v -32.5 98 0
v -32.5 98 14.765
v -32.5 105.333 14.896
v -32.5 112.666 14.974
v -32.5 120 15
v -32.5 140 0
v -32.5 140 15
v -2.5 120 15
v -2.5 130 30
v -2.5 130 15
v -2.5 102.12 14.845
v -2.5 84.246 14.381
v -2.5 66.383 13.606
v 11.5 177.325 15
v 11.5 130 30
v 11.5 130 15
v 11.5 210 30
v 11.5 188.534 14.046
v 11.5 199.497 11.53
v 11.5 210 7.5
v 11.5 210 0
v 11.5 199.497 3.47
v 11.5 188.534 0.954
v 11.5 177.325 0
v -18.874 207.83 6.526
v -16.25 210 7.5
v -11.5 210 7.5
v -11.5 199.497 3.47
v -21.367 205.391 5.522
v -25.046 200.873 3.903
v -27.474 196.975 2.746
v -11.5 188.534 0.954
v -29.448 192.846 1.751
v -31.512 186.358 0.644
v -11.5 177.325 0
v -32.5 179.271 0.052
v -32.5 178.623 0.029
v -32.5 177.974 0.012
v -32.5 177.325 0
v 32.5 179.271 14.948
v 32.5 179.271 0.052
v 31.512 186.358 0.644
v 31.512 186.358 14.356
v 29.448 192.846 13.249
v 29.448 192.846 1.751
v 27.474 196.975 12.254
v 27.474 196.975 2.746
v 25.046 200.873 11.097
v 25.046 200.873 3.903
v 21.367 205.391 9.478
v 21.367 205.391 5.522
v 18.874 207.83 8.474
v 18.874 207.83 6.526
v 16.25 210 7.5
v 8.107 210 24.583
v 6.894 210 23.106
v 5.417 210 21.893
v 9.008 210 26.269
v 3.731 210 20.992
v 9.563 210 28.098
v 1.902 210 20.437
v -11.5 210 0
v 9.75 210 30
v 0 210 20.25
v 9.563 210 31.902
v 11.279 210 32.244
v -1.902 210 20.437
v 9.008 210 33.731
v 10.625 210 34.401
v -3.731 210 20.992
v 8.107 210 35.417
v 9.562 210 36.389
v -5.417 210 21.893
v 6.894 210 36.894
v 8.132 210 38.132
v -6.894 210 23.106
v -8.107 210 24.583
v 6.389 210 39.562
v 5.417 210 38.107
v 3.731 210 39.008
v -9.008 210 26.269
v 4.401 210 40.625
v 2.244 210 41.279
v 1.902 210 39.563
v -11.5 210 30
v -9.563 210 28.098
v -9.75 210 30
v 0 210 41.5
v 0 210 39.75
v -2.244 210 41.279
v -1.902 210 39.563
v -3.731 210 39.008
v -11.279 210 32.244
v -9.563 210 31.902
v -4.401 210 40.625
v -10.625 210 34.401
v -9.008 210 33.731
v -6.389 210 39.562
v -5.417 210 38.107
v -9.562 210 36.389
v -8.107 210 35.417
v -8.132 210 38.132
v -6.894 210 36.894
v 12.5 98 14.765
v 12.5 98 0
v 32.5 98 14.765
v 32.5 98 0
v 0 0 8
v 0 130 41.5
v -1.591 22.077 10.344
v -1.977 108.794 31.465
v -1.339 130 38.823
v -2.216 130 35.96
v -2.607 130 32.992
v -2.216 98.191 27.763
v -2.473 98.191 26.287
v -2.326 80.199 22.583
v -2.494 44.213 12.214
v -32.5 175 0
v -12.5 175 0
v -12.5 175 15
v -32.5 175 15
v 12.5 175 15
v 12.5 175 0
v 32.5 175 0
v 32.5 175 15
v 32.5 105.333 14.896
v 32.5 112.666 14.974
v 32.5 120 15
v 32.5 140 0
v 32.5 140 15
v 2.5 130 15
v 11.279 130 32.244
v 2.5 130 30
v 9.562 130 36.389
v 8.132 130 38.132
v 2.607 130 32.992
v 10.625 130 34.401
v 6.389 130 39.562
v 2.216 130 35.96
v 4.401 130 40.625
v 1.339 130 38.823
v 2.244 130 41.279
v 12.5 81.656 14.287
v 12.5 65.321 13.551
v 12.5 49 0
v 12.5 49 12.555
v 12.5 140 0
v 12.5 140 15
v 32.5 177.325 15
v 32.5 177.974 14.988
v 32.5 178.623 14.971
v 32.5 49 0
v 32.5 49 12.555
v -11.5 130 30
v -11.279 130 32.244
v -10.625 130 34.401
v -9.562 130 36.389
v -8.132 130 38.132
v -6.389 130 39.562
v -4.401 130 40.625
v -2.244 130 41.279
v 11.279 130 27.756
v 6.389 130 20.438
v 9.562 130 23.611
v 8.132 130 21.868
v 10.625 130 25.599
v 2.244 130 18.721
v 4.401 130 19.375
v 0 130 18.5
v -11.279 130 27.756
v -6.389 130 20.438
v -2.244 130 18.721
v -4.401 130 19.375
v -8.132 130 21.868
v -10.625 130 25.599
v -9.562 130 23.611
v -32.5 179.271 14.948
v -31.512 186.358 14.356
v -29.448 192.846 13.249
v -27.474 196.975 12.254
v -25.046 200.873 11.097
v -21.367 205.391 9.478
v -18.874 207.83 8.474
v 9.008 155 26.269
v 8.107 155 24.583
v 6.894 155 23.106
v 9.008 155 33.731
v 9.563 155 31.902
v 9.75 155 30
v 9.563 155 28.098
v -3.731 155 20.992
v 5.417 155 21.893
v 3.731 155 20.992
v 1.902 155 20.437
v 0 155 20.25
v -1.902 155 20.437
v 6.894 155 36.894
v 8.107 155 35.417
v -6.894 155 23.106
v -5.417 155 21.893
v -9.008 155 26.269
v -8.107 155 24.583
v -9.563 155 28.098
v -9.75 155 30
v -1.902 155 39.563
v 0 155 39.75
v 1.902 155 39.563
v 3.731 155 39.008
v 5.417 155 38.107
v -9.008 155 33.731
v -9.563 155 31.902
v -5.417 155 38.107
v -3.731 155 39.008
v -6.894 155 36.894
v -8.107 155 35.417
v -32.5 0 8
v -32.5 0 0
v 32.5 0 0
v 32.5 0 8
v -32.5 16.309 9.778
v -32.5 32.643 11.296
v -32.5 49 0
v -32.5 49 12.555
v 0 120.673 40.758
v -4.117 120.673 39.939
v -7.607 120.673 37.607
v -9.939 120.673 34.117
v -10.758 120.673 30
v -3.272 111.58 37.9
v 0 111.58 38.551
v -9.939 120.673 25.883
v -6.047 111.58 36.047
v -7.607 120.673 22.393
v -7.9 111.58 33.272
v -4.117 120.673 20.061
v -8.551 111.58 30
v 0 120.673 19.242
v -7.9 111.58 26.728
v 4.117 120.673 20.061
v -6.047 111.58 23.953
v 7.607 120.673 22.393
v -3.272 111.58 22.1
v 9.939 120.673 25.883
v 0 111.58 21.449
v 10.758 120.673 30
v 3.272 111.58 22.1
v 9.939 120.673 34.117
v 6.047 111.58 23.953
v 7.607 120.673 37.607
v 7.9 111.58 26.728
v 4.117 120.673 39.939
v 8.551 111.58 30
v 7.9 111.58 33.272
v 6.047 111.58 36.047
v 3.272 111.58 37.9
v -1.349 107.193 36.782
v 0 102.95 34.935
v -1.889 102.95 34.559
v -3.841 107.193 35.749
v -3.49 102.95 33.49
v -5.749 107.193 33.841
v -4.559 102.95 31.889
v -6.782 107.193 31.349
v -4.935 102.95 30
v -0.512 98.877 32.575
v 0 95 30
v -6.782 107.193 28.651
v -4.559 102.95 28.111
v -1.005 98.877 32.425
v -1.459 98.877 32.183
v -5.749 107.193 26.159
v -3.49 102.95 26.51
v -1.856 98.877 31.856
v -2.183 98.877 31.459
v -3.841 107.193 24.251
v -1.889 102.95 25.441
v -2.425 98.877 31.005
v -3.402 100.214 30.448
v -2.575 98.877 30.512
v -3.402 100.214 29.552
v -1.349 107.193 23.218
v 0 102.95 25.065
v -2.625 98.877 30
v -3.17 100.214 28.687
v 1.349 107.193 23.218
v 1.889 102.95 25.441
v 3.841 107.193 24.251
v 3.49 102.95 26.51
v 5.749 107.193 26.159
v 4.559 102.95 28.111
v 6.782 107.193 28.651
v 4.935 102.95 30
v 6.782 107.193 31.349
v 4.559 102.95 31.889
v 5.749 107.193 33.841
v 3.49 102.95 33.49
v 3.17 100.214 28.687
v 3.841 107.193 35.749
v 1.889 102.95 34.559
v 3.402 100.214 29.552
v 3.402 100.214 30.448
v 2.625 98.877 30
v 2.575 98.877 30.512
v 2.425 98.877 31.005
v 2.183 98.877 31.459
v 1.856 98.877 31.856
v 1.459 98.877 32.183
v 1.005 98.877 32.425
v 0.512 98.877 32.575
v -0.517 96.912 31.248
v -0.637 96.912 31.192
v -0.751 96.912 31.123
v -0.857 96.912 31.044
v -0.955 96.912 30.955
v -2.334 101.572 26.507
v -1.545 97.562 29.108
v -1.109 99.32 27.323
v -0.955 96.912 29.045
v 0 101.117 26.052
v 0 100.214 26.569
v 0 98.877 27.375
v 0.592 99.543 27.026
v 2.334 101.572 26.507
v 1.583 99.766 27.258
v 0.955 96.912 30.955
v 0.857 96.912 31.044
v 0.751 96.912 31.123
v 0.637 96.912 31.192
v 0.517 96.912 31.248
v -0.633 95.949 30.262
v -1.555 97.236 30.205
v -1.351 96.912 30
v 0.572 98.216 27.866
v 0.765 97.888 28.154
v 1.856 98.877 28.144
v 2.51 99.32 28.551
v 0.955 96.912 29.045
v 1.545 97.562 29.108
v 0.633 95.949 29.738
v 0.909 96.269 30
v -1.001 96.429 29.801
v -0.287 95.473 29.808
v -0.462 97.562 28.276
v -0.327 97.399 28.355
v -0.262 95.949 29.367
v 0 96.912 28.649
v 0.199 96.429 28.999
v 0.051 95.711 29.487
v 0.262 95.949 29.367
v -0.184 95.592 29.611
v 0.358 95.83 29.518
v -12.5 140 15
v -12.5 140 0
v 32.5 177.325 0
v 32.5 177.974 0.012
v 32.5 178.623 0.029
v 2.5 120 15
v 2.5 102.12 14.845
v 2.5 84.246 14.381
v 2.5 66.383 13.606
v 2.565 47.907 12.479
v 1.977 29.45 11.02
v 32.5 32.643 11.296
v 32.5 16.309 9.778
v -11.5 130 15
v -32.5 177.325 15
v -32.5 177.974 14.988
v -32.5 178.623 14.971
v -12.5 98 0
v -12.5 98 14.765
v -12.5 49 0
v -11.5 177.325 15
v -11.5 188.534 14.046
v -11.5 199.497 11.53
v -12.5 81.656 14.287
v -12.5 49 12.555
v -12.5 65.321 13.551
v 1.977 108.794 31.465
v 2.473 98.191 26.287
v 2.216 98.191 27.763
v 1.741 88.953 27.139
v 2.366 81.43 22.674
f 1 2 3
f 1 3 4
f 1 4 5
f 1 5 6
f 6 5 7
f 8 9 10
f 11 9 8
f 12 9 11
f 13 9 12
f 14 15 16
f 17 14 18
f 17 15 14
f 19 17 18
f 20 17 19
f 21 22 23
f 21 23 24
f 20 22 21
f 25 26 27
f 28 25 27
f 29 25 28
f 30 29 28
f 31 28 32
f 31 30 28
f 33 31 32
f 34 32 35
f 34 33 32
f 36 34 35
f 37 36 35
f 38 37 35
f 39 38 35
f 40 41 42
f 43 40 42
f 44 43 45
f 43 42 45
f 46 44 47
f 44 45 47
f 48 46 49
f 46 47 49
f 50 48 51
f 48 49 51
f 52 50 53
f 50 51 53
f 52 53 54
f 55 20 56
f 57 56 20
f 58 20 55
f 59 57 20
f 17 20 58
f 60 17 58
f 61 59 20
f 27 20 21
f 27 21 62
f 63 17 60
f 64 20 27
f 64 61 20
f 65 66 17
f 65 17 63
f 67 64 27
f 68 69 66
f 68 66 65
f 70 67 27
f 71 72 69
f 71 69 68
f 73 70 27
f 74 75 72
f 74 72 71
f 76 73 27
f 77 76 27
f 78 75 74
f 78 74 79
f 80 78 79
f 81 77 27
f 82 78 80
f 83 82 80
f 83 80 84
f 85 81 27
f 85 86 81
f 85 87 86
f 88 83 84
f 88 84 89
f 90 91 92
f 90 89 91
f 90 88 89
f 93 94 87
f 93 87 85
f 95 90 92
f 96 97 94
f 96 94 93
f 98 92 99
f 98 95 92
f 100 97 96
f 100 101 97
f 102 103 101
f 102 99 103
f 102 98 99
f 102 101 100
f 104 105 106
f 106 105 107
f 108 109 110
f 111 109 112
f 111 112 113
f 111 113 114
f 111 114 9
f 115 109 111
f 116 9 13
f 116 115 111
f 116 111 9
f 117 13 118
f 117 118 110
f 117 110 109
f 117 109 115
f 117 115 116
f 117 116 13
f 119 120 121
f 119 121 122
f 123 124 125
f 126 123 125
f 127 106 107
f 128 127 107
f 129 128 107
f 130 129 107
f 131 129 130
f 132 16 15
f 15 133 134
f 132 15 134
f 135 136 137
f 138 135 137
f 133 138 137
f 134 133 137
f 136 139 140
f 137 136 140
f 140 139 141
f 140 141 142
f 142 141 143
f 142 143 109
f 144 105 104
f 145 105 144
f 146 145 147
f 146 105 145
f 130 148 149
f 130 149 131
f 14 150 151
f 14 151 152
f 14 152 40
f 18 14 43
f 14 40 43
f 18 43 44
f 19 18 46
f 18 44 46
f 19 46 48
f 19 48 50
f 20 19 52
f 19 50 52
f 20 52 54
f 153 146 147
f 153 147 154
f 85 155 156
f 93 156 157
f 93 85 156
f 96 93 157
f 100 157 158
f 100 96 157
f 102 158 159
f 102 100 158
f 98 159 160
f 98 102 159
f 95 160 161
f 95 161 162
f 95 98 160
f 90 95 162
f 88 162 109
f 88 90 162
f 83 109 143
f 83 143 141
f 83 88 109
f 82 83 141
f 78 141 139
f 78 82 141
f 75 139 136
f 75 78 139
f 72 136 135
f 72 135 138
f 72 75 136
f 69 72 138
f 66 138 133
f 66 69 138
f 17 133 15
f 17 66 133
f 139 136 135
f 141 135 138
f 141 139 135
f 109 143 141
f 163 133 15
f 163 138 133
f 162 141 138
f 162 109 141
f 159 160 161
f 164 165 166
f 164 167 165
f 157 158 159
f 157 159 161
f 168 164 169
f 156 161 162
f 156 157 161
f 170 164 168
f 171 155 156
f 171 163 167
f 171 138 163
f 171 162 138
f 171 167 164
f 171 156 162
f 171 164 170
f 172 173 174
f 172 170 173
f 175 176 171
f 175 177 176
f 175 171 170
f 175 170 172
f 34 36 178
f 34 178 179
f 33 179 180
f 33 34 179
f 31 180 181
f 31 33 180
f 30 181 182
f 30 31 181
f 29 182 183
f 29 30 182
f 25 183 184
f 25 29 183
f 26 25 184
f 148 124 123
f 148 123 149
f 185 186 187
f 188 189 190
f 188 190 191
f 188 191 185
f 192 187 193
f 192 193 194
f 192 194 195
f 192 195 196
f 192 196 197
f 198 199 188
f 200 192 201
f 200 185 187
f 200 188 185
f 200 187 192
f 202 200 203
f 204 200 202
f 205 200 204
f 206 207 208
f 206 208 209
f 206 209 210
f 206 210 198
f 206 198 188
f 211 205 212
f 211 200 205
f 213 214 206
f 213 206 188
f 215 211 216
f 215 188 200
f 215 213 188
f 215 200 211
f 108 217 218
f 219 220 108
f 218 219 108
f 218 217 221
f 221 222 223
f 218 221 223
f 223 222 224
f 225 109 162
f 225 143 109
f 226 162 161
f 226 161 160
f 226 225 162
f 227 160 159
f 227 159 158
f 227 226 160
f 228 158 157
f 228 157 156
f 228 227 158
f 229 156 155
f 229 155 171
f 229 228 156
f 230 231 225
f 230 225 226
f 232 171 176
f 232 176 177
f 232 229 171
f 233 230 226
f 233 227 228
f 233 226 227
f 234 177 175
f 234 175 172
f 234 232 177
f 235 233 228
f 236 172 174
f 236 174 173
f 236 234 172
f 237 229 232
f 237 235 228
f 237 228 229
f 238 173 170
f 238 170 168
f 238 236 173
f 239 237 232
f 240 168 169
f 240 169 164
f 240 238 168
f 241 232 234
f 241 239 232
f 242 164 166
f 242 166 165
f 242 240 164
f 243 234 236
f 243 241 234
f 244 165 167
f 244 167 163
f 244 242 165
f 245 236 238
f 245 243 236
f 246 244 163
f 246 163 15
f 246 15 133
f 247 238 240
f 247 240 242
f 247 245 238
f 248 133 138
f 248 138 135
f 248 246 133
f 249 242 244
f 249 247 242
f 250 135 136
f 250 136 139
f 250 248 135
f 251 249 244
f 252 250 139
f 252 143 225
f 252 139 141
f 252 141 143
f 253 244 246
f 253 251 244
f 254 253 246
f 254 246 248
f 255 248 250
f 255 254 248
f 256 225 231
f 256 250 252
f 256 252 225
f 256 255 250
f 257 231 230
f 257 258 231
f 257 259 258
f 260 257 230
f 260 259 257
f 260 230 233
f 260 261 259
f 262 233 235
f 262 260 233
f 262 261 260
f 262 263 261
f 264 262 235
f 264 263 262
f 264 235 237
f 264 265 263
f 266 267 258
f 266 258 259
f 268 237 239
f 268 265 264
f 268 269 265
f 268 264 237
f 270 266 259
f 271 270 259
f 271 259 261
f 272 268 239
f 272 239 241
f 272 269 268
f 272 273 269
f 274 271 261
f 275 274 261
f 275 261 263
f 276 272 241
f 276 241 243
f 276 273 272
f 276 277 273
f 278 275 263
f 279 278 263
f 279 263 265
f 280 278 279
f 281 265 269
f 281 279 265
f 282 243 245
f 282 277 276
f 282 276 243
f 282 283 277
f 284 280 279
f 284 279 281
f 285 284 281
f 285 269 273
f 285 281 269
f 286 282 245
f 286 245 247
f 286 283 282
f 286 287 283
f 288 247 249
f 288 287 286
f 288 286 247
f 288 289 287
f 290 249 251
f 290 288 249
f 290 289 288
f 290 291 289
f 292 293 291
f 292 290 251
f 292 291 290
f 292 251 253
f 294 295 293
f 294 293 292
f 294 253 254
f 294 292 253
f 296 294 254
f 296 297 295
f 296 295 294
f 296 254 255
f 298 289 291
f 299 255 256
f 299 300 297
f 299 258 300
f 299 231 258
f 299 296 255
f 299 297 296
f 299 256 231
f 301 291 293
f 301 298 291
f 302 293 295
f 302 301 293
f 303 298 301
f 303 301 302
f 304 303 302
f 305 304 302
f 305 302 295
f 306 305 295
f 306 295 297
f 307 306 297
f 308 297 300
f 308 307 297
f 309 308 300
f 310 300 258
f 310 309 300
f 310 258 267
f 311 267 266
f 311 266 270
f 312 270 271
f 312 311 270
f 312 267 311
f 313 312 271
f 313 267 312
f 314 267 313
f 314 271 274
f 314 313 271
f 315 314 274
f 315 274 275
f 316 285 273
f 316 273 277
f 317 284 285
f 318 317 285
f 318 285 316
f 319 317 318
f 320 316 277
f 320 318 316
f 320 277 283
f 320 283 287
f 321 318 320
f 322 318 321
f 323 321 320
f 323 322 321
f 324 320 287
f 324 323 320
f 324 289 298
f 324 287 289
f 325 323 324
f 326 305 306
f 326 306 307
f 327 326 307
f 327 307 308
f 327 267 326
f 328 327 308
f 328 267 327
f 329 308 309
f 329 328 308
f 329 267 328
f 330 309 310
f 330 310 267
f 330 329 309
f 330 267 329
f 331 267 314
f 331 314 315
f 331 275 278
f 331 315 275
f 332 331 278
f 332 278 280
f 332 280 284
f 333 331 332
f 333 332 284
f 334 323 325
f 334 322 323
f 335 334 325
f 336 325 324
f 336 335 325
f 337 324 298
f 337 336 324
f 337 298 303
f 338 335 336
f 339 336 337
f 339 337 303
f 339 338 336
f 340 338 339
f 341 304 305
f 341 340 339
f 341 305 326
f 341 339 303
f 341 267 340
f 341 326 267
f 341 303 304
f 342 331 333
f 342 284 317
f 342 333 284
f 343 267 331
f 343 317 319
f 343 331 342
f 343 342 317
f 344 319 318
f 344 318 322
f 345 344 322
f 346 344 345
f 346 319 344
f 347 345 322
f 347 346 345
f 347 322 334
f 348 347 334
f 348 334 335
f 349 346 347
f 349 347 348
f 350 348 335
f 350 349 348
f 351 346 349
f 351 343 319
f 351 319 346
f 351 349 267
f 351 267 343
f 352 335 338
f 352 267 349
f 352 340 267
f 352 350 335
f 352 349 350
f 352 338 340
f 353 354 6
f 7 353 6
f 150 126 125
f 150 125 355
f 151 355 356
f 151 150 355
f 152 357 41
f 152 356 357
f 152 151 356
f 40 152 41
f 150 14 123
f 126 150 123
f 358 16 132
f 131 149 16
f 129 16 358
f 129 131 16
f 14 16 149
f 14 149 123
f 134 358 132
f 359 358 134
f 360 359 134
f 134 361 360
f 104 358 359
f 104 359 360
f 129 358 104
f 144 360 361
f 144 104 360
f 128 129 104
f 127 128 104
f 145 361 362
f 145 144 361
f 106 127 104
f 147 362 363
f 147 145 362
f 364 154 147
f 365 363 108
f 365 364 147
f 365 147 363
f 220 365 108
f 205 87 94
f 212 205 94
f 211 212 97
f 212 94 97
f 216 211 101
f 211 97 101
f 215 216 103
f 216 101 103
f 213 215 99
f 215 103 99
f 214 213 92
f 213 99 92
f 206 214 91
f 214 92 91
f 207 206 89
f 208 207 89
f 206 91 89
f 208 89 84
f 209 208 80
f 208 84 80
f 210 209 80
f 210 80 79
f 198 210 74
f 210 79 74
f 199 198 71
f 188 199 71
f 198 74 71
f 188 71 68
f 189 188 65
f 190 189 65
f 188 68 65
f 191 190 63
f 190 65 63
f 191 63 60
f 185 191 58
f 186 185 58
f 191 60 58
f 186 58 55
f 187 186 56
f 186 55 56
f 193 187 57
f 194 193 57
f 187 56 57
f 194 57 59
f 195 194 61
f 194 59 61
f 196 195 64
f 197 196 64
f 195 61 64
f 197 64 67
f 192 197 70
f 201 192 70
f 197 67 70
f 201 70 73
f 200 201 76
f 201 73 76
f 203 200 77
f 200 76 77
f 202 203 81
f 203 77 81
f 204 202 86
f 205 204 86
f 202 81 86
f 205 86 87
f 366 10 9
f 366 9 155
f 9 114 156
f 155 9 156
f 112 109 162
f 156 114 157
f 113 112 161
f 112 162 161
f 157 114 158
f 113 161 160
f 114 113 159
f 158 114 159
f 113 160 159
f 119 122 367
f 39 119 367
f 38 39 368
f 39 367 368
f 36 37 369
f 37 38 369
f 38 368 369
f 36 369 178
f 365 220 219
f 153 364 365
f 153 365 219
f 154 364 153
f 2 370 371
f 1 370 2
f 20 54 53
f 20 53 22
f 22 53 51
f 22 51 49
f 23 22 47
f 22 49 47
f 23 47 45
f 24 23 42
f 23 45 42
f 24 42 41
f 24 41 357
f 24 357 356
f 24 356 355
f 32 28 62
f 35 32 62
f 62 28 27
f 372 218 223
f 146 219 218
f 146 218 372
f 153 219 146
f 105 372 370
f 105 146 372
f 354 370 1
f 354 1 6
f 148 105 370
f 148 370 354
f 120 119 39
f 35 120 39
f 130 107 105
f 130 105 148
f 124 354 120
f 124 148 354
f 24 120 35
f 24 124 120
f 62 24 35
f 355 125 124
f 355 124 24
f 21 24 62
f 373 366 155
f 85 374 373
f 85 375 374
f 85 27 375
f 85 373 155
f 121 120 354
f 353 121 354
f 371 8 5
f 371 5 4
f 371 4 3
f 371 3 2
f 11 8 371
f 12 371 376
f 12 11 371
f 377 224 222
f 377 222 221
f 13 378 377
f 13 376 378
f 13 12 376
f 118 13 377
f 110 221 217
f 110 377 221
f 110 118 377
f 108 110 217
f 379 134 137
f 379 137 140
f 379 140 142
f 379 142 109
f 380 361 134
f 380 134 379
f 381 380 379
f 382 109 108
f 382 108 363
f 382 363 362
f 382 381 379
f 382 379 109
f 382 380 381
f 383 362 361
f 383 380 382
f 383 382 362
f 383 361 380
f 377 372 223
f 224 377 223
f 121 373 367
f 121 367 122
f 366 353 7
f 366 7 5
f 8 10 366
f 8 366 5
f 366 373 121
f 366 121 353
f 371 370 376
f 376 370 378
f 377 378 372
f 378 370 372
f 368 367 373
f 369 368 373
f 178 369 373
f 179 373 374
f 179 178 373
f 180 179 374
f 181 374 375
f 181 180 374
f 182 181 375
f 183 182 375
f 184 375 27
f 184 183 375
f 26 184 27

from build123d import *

# Parameters (mm, degrees)
F1_DEPTH  = 32.5
F2_W      = 20
F2_H      = 49
F2_H_2    = 35
F4_DEPTH  = 15.001
F5_DEPTH  = 21
F7_R      = 9.75
F8_DEPTH  = 80
F9_DEPTH  = 55
F16_DEPTH = 35.0010001
F18_DEPTH = 65.0010001


with BuildPart() as f1:
    # F0 (on Right) → F1 (new body)
    with BuildSketch(Plane.YZ):
        with BuildLine():
            Line((0, 8), (0, 0))
            Line((0, 0), (210, 0))
            Line((210, 0), (210, 15))
            Line((210, 15), (120, 15))
            ThreePointArc((120, 15), (59.898003361, 13.2485138122), (0, 8))
        make_face()
    extrude(amount=F1_DEPTH)

    # F2 (on face) → F4 (cut, through all)
    with BuildSketch(Plane(origin=(0, 0, 0), x_dir=(1, 0, 0), z_dir=(0, 0, -1))):
        with Locations((22.5, -73.5)):
            Rectangle(F2_W, F2_H)
        with Locations((22.5, -157.5)):
            Rectangle(F2_W, F2_H_2)
        with BuildLine():
            Line((32.5, -210), (32.5, -179.2712736624))
            ThreePointArc((32.5, -179.2712736624), (27.7678036817, -196.4298231317), (16.25, -210))
            Line((16.25, -210), (32.5, -210))
        make_face()
    extrude(amount=-F4_DEPTH, mode=Mode.SUBTRACT)

    # F3 (on face) → F5 (cut)
    with BuildSketch(Plane.YZ.offset(32.5)):
        with BuildLine():
            Line((210, 15), (177.3250487525, 15))
            ThreePointArc((177.3250487525, 15), (194.0598007054, 12.980797958), (210, 7.5))
            Line((210, 7.5), (210, 15))
        make_face()
        with BuildLine():
            ThreePointArc((210, 7.5), (194.0598007054, 2.019202042), (177.3250487525, 0))
            Line((177.3250487525, 0), (210, 0))
            Line((210, 0), (210, 7.5))
        make_face()
    extrude(amount=-F5_DEPTH, mode=Mode.SUBTRACT)

    # F6: F1 across plane


with BuildPart() as f1_1:
    add(f1.part)
    add(f1.part.mirror(Plane.YZ))

    # F7 (on face) → F8 (join)
    with BuildSketch(Plane(origin=(0, 210, 0), x_dir=(-1, 0, 0), z_dir=(0, 1, 0))):
        with BuildLine():
            Line((-11.5, 30), (-11.5, 15))
            Line((-11.5, 15), (11.5, 15))
            Line((11.5, 15), (11.5, 30))
            ThreePointArc((11.5, 30), (0, 41.5), (-11.5, 30))
        make_face()
        with Locations((0, 30)):
            Circle(F7_R, mode=Mode.SUBTRACT)
        with Locations((0, 30)):
            Circle(F7_R)
    extrude(amount=-F8_DEPTH)

    # F7 (on face) → F9 (cut)
    with BuildSketch(Plane(origin=(0, 210, 0), x_dir=(-1, 0, 0), z_dir=(0, 1, 0))):
        with Locations((0, 30)):
            Circle(F7_R)
    extrude(amount=-F9_DEPTH, mode=Mode.SUBTRACT)

    # F14: sweep along a path in F13
    with BuildLine(Plane.YZ) as f14_path:
        Line((130, 41.5), (0, 8))
    # F12 (on face) → F14 (sweep)
    with BuildSketch(Plane.XZ.offset(-130)):
        with BuildLine():
            Line((-2.5, 15), (2.5, 15))
            Line((2.5, 15), (2.5, 30))
            ThreePointArc((2.5, 30), (2.2164021774, 35.9600874299), (0, 41.5))
            ThreePointArc((0, 41.5), (-2.2164021774, 35.9600874299), (-2.5, 30))
            Line((-2.5, 30), (-2.5, 15))
        make_face()
    sweep(path=f14_path.line)

    # F15 (on face) → F16 (cut, through all)
    with BuildSketch(Plane.YZ.offset(2.5)):
        Polygon((0, 0), (0, -3.5), (13.5820895522, 0), align=None)
        Polygon((13.5820895522, 0), (0, -3.5), (0, -18.5), (71.7910447761, 0), (49, 0), align=None)
    extrude(amount=-F16_DEPTH, mode=Mode.SUBTRACT)

    # F17 (on face) → F18 (cut, through all)
    with BuildSketch(Plane.YZ.offset(32.5)):
        Polygon((0, -3.5), (13.5820895522, 0), (0, 0), align=None)
    extrude(amount=-F18_DEPTH, mode=Mode.SUBTRACT)


with BuildPart() as f11:
    # F10 (on Right) → F11 (revolve)
    with BuildSketch(Plane.YZ):
        with BuildLine():
            Line((95, 30), (130, 30))
            Line((130, 30), (130, 41.5))
            ThreePointArc((130, 41.5), (111.5795629802, 38.5513300602), (95, 30))
        make_face()
    revolve(axis=Axis((0, 112.5, 30), (0, -1, 0)))


solid = Compound([f1_1.part, f11.part])
